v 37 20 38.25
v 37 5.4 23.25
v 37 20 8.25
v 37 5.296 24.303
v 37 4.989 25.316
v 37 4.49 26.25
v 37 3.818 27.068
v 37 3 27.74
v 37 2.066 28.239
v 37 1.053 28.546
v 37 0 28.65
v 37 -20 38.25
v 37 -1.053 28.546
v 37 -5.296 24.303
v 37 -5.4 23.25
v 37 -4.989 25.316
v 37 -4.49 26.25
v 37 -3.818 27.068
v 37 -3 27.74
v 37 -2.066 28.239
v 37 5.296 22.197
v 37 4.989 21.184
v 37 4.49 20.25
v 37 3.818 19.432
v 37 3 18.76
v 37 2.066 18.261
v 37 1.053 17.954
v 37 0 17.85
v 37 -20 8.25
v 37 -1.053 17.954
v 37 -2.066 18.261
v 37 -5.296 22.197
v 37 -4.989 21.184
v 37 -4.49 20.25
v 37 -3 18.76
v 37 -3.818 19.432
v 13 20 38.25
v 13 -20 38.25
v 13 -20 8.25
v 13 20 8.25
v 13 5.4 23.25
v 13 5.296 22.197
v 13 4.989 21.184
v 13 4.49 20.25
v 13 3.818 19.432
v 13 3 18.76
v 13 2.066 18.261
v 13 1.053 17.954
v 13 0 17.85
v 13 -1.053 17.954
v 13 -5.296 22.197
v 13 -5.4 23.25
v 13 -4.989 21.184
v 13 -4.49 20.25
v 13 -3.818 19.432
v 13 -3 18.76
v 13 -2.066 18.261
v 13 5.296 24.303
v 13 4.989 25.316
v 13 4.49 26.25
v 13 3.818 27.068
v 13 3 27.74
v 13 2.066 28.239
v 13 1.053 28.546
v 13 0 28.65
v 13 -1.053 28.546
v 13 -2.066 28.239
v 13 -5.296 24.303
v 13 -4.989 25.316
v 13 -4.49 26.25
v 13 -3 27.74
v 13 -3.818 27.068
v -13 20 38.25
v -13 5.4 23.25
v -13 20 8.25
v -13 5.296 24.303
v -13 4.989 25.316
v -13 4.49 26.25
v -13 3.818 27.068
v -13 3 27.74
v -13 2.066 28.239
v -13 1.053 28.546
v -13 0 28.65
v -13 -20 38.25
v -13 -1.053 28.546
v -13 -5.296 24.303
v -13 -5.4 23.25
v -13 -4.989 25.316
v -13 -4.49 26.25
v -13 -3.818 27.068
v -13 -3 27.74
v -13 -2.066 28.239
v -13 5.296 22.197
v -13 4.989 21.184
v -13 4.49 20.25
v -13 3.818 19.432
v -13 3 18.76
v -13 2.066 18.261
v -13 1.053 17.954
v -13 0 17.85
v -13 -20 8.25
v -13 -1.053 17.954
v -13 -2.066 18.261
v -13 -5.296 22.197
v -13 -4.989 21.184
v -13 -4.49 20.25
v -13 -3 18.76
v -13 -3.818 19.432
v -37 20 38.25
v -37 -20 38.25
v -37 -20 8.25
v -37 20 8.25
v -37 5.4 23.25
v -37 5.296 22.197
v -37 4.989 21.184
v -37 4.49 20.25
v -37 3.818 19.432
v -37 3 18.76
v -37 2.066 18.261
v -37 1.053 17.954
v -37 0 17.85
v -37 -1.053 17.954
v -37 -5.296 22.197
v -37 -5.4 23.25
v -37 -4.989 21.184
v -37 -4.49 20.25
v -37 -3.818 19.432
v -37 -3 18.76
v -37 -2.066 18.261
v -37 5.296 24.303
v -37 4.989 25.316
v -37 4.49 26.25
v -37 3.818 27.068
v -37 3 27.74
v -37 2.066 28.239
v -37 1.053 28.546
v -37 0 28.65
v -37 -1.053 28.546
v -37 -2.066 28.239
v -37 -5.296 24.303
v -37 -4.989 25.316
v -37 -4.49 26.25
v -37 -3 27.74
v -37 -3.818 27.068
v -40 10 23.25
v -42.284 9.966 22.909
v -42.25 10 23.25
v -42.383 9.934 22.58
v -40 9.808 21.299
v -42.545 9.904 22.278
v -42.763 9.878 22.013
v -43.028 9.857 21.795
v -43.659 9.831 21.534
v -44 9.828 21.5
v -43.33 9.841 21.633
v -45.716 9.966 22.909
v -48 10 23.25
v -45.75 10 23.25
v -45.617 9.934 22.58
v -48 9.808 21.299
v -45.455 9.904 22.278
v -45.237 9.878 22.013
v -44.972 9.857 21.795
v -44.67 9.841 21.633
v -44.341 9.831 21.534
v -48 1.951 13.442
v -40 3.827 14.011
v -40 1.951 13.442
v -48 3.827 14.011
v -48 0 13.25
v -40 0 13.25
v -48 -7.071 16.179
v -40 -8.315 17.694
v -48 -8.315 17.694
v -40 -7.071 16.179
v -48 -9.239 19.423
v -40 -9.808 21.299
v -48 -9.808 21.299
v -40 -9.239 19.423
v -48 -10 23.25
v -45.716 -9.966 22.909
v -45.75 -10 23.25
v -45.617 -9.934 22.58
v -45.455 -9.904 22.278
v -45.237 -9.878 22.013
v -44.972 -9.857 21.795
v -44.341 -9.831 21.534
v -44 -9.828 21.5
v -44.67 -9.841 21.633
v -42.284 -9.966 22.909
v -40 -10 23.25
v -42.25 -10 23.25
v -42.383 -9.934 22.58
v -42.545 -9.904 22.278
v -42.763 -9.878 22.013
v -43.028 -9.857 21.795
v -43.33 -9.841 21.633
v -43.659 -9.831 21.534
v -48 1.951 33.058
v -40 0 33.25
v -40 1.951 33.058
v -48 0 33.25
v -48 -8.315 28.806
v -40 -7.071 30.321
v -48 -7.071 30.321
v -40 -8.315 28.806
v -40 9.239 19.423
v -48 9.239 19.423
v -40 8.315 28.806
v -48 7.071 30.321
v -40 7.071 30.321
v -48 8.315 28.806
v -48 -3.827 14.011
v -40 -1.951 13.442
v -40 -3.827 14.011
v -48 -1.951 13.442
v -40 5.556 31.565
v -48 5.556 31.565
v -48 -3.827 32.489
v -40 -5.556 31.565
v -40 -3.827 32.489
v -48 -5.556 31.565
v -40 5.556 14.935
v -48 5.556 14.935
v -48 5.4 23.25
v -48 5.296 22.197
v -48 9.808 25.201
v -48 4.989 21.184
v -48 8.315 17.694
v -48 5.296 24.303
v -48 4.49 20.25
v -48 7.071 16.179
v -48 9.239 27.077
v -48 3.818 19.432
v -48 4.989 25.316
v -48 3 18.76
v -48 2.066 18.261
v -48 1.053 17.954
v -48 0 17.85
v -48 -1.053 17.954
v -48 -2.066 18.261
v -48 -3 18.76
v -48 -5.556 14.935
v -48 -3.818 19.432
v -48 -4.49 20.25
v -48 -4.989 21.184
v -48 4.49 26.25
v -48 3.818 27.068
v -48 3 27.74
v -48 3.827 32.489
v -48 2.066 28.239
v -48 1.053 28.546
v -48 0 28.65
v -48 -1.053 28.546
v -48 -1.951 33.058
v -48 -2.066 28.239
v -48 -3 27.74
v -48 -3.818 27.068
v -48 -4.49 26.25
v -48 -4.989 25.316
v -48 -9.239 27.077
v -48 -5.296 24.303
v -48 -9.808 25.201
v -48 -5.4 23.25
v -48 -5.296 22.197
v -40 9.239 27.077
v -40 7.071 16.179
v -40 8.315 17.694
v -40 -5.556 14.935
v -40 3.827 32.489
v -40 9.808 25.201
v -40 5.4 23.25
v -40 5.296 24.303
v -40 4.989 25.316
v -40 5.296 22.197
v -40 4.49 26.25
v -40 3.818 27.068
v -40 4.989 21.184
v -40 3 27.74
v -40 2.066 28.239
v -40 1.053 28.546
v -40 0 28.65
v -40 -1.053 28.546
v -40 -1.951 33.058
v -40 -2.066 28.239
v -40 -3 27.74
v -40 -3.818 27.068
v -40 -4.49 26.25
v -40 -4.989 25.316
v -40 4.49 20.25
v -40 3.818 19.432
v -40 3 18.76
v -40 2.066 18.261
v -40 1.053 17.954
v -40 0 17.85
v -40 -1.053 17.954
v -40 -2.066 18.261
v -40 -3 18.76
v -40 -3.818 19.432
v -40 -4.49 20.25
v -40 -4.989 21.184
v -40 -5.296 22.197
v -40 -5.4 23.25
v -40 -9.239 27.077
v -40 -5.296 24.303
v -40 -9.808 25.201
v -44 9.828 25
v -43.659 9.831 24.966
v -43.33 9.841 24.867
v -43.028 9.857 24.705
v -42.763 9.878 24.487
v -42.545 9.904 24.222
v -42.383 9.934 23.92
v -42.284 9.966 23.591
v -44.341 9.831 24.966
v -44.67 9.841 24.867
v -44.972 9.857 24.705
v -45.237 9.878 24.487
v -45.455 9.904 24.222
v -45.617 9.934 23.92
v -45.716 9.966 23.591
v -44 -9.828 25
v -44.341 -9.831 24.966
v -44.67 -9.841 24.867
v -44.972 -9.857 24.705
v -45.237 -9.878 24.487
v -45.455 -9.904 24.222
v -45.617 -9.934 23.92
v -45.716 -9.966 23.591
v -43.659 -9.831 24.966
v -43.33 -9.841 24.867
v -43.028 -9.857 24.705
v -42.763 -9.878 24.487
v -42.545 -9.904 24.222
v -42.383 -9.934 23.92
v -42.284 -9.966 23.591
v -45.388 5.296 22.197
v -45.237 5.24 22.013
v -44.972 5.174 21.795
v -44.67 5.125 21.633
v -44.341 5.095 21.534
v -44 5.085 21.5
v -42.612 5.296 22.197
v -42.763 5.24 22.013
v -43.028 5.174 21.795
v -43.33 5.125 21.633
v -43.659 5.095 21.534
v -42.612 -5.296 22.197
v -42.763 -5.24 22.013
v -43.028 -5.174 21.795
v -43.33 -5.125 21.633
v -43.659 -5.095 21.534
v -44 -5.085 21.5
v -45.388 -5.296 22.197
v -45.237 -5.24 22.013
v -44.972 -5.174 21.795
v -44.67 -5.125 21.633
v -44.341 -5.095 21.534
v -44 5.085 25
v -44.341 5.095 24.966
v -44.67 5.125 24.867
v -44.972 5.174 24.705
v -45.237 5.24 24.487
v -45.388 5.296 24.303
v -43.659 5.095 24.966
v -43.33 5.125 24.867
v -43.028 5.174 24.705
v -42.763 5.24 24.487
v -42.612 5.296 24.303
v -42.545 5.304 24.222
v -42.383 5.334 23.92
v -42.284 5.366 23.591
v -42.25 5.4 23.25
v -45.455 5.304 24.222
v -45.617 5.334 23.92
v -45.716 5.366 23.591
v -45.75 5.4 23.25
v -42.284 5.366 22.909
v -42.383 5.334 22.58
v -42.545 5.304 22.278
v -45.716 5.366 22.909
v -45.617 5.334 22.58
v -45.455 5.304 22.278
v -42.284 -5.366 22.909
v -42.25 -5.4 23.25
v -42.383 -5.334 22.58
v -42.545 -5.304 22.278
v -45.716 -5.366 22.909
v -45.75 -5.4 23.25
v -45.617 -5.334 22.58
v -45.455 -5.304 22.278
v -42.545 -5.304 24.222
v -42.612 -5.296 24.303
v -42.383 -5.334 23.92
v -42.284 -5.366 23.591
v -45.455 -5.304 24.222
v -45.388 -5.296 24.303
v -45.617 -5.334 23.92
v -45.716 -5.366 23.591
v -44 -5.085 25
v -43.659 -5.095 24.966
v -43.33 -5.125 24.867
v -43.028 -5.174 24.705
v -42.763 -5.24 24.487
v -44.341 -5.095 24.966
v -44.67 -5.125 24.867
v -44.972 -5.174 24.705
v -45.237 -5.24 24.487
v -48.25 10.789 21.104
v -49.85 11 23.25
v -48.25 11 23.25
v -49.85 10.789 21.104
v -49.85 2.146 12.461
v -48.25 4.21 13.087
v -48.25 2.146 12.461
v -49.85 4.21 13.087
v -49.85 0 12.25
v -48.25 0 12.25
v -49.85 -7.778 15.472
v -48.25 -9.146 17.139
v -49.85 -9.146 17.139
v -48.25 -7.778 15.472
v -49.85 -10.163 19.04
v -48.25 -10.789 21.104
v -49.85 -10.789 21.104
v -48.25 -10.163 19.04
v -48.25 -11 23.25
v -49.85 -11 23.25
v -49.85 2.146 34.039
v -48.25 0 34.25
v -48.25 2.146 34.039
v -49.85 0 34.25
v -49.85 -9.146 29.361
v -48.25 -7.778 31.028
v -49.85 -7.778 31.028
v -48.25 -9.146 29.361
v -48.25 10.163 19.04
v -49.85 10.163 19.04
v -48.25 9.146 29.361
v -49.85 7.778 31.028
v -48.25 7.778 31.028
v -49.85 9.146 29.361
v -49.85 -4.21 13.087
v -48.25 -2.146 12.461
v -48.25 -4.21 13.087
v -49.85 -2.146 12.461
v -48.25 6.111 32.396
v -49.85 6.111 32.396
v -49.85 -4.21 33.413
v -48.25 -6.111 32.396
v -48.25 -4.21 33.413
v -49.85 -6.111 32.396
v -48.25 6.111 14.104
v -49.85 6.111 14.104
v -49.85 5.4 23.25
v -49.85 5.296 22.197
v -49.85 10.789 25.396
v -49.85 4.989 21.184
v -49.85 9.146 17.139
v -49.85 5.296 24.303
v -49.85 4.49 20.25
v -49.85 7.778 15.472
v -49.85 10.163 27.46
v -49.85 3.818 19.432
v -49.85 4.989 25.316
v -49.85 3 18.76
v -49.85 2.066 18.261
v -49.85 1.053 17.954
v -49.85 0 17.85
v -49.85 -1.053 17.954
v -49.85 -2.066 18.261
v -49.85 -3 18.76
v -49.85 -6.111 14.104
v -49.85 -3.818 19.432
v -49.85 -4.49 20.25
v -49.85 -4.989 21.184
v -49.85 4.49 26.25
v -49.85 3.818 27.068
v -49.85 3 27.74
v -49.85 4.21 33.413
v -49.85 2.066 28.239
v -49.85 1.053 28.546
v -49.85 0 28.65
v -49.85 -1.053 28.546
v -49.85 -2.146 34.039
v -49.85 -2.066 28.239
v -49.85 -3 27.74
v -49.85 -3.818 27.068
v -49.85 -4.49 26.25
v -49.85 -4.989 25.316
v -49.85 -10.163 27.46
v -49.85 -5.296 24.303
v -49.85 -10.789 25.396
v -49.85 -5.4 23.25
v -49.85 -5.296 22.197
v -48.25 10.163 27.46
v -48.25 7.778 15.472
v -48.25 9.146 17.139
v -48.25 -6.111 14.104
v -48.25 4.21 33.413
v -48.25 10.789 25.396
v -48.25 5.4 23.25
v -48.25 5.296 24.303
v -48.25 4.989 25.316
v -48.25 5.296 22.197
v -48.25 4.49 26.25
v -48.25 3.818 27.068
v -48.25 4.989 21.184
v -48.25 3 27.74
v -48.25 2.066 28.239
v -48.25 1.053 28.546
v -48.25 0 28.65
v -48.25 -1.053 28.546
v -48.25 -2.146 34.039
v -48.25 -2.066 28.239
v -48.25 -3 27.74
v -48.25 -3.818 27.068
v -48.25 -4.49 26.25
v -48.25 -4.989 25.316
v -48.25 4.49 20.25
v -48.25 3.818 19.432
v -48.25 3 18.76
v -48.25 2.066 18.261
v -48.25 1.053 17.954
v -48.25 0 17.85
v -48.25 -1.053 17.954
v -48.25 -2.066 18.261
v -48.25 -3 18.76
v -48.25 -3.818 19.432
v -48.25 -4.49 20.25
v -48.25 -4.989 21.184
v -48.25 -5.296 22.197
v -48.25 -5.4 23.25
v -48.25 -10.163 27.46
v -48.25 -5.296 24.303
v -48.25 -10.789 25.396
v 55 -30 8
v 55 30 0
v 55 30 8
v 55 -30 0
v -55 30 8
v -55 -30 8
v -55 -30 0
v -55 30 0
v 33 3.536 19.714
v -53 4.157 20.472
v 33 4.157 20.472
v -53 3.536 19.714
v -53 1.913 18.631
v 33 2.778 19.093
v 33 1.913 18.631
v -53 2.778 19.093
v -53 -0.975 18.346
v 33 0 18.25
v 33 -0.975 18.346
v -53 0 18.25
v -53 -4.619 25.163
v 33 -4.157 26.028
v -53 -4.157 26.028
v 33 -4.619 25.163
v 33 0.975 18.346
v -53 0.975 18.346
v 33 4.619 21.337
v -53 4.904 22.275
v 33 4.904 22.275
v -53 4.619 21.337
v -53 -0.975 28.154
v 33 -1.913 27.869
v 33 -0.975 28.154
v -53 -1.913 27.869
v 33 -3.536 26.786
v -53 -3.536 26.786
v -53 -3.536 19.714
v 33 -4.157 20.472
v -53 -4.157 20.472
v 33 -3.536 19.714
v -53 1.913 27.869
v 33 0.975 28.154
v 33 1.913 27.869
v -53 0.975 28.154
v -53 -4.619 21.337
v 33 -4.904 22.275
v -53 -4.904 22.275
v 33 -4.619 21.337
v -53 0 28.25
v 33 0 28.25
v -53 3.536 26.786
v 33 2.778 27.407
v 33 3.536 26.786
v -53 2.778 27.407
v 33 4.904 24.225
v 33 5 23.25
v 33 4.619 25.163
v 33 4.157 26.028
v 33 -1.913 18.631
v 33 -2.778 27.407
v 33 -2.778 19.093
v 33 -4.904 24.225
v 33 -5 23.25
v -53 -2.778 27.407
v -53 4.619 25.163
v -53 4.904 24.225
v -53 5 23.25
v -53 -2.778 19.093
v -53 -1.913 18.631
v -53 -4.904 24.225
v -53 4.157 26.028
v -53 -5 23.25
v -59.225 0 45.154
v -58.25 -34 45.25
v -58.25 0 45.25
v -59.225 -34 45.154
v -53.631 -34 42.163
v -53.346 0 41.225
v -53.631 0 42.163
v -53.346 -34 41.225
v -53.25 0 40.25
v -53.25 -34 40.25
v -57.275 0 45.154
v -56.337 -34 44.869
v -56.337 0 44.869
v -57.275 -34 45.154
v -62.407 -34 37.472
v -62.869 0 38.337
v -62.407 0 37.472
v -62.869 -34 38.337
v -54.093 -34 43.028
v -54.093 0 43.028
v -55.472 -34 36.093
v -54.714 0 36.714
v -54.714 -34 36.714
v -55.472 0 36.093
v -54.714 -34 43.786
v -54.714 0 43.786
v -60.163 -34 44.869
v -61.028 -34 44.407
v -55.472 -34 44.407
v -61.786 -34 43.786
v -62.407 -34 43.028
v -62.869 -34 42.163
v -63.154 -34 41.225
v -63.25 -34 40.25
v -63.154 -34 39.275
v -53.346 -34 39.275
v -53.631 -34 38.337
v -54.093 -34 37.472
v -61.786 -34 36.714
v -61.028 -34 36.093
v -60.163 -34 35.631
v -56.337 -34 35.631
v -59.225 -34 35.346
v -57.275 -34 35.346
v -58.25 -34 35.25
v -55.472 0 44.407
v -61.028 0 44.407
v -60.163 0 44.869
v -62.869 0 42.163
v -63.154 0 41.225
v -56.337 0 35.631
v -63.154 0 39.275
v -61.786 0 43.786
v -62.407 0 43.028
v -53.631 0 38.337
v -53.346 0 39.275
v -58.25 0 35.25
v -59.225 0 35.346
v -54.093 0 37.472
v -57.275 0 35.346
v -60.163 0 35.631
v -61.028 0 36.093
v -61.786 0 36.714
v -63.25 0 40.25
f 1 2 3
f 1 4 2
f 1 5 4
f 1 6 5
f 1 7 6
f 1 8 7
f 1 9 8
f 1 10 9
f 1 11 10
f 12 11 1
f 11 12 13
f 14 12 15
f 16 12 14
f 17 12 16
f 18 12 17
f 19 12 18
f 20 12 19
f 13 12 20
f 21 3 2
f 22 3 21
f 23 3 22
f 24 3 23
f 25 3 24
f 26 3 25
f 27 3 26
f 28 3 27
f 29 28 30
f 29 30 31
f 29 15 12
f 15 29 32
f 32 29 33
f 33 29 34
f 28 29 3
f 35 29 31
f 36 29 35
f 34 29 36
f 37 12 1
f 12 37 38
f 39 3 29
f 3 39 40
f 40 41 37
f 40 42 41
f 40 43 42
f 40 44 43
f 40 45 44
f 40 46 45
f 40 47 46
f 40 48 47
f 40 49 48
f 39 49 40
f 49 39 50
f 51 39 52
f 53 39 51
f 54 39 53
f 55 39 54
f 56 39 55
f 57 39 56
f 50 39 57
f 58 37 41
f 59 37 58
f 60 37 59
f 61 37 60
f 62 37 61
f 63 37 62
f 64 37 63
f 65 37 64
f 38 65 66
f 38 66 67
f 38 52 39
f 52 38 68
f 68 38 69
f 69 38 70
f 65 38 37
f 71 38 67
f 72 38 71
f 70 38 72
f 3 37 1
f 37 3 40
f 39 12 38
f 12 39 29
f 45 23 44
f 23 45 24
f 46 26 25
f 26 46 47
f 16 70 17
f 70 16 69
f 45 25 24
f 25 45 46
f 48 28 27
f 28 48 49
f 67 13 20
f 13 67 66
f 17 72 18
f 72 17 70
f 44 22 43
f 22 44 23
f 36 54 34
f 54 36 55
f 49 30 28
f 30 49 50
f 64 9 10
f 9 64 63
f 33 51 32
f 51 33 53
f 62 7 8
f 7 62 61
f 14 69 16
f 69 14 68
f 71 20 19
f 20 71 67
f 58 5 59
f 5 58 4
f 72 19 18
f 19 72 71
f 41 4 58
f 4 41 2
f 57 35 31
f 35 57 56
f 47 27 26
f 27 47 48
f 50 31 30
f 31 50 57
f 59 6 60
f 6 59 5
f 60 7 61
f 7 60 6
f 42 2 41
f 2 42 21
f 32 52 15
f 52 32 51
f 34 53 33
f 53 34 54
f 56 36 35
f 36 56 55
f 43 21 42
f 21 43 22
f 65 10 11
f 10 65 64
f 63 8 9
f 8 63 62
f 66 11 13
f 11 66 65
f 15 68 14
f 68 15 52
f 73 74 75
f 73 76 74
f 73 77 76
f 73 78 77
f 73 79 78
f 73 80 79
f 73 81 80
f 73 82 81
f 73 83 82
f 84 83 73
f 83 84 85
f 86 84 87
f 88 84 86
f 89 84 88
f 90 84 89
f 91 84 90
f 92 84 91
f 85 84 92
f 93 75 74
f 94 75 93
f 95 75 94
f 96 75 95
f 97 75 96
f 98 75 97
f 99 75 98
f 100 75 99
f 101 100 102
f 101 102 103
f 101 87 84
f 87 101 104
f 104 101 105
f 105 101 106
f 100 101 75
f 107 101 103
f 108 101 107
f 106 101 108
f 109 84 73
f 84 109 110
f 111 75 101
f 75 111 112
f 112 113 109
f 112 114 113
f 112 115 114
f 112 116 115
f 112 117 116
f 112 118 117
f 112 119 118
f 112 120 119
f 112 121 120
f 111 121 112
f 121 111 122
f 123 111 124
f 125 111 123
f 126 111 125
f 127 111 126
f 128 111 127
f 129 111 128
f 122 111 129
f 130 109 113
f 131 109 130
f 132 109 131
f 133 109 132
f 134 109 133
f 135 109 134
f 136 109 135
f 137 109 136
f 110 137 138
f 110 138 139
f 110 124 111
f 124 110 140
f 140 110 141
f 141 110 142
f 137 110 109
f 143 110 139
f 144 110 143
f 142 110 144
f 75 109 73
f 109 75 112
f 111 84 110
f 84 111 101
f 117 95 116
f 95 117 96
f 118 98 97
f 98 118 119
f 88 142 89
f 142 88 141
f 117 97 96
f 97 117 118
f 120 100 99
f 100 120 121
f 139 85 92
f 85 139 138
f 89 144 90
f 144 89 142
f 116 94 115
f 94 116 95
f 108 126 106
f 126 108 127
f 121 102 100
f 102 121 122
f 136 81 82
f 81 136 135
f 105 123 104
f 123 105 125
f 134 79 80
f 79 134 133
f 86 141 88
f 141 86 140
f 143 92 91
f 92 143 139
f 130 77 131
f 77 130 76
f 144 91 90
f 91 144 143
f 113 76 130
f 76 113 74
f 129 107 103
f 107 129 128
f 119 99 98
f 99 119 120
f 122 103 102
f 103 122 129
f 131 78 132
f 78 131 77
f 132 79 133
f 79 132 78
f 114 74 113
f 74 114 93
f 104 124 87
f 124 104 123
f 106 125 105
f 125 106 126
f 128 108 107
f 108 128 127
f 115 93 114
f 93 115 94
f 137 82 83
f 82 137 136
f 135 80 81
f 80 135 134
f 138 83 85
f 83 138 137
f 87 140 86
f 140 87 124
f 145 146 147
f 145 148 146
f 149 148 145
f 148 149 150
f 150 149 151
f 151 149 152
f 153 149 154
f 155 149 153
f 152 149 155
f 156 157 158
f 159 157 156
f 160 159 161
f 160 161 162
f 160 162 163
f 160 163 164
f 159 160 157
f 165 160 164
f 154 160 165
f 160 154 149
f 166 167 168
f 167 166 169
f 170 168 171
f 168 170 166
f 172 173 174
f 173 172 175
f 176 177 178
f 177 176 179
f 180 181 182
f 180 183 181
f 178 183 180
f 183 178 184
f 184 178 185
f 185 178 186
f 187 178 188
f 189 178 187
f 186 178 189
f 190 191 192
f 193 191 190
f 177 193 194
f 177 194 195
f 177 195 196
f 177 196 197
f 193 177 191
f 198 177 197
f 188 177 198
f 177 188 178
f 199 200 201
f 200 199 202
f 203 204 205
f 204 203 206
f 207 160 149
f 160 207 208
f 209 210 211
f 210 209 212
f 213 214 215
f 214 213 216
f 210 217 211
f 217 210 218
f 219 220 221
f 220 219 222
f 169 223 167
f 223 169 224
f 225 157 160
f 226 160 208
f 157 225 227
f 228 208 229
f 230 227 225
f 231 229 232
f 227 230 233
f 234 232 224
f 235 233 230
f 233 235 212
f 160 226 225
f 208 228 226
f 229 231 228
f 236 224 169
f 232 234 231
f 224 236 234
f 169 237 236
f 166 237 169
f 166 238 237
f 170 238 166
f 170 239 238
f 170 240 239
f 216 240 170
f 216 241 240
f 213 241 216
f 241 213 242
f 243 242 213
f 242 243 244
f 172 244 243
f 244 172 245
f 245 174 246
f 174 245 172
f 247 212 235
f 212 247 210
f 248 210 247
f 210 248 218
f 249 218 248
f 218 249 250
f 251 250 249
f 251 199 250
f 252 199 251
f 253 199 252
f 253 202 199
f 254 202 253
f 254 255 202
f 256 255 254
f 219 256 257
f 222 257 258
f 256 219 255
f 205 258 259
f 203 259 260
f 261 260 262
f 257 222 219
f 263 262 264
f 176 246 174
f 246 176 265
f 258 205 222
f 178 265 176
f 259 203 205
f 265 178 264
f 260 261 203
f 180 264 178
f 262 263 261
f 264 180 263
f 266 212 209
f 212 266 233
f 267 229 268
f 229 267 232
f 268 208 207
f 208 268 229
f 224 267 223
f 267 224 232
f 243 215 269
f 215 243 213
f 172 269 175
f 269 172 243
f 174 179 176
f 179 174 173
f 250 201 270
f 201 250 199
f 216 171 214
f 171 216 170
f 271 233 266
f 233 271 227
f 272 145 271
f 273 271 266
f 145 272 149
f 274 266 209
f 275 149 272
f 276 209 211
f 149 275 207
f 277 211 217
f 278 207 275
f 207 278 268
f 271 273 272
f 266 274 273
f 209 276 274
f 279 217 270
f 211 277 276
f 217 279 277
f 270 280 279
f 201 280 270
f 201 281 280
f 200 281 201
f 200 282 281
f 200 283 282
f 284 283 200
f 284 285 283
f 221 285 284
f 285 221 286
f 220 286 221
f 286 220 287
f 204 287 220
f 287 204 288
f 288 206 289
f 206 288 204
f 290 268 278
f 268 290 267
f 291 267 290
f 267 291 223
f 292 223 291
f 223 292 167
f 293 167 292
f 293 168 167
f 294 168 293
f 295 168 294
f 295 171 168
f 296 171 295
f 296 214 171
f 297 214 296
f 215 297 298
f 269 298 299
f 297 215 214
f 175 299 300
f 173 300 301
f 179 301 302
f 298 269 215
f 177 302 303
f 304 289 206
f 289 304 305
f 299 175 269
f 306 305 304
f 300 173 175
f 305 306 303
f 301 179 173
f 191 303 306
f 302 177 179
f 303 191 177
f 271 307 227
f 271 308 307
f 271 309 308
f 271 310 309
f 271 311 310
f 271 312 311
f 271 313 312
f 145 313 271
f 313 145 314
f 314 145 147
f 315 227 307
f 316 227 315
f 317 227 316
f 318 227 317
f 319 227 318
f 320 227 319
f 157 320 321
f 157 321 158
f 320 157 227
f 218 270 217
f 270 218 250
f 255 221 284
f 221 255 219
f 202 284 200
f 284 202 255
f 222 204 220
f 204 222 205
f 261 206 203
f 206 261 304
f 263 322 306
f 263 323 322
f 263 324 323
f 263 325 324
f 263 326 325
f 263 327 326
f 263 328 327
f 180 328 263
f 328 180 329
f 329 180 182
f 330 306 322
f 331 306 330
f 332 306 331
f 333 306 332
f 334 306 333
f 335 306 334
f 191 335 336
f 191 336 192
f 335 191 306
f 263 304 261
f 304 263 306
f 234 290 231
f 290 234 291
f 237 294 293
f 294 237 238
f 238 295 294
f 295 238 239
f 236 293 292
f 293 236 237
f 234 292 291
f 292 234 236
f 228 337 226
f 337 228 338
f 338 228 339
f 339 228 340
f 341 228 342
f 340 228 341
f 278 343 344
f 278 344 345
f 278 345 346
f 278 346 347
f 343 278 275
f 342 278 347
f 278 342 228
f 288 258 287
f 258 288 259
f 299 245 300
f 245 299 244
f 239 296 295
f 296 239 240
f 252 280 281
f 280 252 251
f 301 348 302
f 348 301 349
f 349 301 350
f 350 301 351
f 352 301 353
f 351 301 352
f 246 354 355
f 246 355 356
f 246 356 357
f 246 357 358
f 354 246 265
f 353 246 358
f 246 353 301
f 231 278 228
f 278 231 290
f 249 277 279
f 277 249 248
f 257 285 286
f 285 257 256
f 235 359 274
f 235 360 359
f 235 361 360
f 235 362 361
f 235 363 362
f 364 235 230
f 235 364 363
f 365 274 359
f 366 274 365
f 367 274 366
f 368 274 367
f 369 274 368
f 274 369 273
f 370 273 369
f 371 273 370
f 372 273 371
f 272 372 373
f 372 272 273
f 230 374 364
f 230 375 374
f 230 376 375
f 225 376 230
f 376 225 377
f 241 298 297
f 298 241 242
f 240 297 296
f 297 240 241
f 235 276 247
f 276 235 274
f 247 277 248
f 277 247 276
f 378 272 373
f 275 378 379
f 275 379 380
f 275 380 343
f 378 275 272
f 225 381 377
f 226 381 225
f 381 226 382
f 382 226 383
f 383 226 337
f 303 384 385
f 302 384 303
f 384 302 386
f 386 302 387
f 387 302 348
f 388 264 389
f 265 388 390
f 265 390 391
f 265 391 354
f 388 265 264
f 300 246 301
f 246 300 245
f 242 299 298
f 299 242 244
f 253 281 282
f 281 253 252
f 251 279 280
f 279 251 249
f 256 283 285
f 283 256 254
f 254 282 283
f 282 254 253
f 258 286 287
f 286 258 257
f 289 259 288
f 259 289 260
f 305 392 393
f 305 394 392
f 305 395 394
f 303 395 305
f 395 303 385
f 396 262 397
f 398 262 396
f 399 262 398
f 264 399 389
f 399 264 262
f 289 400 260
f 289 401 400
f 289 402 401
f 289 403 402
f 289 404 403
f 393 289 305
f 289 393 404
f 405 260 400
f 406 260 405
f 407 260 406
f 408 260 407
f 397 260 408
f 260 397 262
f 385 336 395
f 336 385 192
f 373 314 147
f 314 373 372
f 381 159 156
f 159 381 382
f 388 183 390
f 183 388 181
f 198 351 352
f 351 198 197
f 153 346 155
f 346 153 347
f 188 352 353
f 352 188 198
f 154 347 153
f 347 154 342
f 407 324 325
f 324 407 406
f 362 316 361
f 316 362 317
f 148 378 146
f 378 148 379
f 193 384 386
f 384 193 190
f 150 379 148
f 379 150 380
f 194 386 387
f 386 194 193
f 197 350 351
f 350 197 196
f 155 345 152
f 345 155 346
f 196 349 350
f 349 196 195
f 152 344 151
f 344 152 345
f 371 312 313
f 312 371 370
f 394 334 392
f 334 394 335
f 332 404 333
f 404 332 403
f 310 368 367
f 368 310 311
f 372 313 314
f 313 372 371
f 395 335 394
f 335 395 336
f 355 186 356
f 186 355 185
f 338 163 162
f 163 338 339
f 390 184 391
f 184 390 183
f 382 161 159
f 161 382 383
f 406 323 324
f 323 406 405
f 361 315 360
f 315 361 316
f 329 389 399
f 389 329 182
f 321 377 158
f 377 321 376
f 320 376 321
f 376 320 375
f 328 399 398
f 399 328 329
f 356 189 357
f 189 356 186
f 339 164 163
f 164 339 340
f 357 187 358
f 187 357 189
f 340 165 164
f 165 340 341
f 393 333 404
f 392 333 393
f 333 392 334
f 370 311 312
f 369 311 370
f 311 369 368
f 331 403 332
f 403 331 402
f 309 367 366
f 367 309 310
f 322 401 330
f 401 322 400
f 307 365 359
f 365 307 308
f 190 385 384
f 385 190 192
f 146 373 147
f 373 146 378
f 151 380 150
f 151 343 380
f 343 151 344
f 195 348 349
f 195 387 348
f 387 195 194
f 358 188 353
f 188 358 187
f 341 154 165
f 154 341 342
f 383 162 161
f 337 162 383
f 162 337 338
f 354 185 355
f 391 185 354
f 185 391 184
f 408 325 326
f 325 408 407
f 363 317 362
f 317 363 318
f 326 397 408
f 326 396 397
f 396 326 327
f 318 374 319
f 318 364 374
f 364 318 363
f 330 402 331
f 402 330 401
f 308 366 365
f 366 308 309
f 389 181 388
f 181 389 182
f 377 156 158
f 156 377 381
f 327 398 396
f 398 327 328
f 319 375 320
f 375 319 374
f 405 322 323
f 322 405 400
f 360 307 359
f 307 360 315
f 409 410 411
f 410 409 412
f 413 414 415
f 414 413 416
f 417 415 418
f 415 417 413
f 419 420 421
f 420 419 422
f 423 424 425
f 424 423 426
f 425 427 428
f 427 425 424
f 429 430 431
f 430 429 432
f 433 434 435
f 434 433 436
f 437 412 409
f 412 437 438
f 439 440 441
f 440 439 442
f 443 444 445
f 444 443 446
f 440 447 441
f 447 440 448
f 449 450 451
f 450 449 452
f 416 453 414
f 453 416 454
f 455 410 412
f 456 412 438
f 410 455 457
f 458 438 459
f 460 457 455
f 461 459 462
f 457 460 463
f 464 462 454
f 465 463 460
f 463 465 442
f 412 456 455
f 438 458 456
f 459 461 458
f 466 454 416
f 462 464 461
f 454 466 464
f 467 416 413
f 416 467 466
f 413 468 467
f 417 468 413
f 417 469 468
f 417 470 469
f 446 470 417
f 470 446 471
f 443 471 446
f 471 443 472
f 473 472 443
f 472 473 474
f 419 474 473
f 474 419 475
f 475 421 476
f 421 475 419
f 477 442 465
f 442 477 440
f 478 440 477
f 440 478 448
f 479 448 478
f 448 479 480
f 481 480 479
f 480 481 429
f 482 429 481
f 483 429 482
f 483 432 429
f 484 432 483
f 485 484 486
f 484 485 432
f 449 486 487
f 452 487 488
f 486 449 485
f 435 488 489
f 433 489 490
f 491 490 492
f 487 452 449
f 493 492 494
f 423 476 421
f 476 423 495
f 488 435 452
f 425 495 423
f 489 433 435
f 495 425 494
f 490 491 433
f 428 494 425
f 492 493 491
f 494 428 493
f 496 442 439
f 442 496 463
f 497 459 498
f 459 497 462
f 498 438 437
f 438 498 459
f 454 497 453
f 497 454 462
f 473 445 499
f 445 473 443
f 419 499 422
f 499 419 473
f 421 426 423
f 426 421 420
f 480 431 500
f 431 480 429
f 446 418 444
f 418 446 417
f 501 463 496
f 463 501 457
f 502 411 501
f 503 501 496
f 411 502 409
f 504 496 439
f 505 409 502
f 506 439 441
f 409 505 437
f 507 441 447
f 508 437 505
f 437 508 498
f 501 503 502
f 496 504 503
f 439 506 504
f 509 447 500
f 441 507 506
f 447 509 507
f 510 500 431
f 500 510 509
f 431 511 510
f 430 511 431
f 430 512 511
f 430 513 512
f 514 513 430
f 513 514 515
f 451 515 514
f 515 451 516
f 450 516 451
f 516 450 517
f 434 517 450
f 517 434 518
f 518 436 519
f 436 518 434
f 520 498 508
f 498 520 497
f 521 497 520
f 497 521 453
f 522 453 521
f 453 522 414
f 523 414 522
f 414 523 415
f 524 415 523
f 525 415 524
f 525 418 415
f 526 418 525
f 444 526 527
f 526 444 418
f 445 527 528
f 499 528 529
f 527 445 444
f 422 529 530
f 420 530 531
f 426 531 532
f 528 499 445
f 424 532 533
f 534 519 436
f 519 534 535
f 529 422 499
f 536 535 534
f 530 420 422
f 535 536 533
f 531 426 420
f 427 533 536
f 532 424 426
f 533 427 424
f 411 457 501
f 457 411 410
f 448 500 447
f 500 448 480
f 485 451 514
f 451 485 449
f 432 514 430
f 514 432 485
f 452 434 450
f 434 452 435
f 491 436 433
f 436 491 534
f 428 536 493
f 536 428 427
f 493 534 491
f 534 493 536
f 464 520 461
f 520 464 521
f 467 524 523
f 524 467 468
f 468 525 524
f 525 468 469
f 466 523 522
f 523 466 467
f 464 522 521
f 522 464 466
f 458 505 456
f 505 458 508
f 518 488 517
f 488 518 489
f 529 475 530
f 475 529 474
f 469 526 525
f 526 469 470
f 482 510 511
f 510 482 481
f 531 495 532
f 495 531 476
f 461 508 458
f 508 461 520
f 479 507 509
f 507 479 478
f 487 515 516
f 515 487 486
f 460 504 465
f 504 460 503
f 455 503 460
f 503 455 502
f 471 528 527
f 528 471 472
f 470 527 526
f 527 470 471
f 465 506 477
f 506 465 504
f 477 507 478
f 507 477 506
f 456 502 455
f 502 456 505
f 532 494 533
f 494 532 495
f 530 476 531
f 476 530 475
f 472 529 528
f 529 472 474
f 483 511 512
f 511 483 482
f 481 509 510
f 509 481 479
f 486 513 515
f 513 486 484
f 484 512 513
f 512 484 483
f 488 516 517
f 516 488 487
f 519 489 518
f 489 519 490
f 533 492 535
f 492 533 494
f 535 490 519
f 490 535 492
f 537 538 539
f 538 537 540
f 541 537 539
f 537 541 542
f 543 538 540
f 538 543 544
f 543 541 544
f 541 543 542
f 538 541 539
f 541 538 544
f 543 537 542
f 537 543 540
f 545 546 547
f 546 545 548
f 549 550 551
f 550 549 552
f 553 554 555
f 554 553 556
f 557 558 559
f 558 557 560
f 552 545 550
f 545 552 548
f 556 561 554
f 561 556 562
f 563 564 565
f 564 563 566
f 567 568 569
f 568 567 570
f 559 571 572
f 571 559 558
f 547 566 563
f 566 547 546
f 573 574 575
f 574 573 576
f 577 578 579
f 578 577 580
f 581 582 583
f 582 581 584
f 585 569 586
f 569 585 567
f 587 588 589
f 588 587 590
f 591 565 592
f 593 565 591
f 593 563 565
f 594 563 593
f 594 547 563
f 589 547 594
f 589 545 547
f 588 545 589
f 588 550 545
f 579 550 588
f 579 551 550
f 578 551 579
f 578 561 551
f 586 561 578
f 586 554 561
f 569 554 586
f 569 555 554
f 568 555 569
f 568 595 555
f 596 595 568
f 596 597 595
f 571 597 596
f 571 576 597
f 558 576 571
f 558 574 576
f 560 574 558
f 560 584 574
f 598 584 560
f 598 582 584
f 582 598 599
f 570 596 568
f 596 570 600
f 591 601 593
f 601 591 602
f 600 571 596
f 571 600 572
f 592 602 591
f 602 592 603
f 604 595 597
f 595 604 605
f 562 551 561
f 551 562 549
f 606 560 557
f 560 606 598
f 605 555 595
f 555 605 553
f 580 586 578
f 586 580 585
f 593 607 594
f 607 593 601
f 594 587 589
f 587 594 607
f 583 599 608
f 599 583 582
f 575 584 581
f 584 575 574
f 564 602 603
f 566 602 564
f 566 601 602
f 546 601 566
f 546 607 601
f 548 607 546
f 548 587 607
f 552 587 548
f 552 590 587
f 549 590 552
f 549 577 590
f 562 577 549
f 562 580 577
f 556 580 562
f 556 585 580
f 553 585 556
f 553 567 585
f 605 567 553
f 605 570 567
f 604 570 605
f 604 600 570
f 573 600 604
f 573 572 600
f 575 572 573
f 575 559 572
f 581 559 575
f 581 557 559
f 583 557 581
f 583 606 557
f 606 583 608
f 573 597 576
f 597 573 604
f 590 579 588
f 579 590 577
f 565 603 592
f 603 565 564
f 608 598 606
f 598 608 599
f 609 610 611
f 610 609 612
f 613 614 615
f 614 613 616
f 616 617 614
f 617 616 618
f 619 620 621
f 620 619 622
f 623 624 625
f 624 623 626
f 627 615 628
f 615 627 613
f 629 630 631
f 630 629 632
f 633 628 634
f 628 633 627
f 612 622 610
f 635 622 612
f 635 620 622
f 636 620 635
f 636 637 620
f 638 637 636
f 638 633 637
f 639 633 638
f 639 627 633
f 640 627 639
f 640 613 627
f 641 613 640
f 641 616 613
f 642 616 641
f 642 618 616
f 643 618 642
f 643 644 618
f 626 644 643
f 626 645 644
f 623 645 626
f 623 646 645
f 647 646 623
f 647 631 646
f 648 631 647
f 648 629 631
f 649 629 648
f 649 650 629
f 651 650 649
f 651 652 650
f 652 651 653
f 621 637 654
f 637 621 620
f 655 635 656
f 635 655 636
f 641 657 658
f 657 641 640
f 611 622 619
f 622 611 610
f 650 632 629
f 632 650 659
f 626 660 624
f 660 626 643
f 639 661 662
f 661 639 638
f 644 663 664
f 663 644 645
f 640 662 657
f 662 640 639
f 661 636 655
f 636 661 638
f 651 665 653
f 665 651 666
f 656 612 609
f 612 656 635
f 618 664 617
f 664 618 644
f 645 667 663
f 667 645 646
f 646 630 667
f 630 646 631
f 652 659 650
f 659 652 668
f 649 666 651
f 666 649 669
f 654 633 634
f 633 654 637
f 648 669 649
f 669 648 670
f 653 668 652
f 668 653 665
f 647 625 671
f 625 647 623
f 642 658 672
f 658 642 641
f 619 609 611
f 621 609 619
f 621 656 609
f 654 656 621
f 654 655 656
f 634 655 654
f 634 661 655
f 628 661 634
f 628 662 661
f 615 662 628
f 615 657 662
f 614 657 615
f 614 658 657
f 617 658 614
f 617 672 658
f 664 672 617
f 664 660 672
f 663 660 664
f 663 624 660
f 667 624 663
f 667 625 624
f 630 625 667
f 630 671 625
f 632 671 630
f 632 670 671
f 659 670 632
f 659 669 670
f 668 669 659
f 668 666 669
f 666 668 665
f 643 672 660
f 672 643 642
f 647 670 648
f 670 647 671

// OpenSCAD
$fn = 32;

// ------------------------------------------------------------------------
// Machine vise: screw d10, jaws 24 x 30 mm
// Every part is its own module, assembly() places every instance.
// ------------------------------------------------------------------------

// --- part 1 ---
module vise_bed() {
  difference() {
    translate([-55, -30, 0]) cube([110, 60, 8]);
  }
}

// --- part 2 ---
module vise_jaw() {
  difference() {
    translate([-12, -20, 0]) cube([24, 40, 30]);
    translate([0, 0, 15]) rotate([0, 90, 0]) cylinder(h = 26, d = 10.8, center = true);
  }
}

// --- part 3 ---
module vise_screw() {
  translate([0, 0, -43]) cylinder(h = 86, d = 10);
}

// --- part 4 ---
module screw_collar() {
  difference() {
    cylinder(h = 8, d = 20);
    translate([0, 0, -1]) cylinder(h = 10, d = 10.8);
    translate([0, 0, 4]) rotate([90, 0, 0]) cylinder(h = 22, d = 3.5, center = true);
  }
}

// --- part 5 ---
module screw_washer() {
  difference() {
      translate([0, 0, 0]) cylinder(h = 1.6, d = 22);
      translate([0, 0, -1]) cylinder(h = 3.6, d = 10.8);
    }
}

// --- part 6 ---
module vise_handle() {
  cylinder(h = 34, d = 10);
}

// --- assembly ---
module assembly() {
  color([0.80, 0.24, 0.20]) translate([0, 0, 0]) rotate([0, 0, 0]) vise_bed();
  color([0.20, 0.45, 0.75]) translate([25, 0, 8.25]) rotate([0, 0, 0]) vise_jaw();
  color([0.25, 0.62, 0.32]) translate([-25, 0, 8.25]) rotate([0, 0, 0]) vise_jaw();
  color([0.92, 0.70, 0.18]) translate([-10, 0, 23.25]) rotate([0, 90, 0]) vise_screw();
  color([0.58, 0.35, 0.70]) translate([-48, 0, 23.25]) rotate([0, 90, 0]) screw_collar();
  color([0.16, 0.66, 0.66]) translate([-49.85, 0, 23.25]) rotate([0, 90, 0]) screw_washer();
  color([0.85, 0.48, 0.18]) translate([-58.25, 0, 40.25]) rotate([90, 0, 0]) vise_handle();
}

assembly();
